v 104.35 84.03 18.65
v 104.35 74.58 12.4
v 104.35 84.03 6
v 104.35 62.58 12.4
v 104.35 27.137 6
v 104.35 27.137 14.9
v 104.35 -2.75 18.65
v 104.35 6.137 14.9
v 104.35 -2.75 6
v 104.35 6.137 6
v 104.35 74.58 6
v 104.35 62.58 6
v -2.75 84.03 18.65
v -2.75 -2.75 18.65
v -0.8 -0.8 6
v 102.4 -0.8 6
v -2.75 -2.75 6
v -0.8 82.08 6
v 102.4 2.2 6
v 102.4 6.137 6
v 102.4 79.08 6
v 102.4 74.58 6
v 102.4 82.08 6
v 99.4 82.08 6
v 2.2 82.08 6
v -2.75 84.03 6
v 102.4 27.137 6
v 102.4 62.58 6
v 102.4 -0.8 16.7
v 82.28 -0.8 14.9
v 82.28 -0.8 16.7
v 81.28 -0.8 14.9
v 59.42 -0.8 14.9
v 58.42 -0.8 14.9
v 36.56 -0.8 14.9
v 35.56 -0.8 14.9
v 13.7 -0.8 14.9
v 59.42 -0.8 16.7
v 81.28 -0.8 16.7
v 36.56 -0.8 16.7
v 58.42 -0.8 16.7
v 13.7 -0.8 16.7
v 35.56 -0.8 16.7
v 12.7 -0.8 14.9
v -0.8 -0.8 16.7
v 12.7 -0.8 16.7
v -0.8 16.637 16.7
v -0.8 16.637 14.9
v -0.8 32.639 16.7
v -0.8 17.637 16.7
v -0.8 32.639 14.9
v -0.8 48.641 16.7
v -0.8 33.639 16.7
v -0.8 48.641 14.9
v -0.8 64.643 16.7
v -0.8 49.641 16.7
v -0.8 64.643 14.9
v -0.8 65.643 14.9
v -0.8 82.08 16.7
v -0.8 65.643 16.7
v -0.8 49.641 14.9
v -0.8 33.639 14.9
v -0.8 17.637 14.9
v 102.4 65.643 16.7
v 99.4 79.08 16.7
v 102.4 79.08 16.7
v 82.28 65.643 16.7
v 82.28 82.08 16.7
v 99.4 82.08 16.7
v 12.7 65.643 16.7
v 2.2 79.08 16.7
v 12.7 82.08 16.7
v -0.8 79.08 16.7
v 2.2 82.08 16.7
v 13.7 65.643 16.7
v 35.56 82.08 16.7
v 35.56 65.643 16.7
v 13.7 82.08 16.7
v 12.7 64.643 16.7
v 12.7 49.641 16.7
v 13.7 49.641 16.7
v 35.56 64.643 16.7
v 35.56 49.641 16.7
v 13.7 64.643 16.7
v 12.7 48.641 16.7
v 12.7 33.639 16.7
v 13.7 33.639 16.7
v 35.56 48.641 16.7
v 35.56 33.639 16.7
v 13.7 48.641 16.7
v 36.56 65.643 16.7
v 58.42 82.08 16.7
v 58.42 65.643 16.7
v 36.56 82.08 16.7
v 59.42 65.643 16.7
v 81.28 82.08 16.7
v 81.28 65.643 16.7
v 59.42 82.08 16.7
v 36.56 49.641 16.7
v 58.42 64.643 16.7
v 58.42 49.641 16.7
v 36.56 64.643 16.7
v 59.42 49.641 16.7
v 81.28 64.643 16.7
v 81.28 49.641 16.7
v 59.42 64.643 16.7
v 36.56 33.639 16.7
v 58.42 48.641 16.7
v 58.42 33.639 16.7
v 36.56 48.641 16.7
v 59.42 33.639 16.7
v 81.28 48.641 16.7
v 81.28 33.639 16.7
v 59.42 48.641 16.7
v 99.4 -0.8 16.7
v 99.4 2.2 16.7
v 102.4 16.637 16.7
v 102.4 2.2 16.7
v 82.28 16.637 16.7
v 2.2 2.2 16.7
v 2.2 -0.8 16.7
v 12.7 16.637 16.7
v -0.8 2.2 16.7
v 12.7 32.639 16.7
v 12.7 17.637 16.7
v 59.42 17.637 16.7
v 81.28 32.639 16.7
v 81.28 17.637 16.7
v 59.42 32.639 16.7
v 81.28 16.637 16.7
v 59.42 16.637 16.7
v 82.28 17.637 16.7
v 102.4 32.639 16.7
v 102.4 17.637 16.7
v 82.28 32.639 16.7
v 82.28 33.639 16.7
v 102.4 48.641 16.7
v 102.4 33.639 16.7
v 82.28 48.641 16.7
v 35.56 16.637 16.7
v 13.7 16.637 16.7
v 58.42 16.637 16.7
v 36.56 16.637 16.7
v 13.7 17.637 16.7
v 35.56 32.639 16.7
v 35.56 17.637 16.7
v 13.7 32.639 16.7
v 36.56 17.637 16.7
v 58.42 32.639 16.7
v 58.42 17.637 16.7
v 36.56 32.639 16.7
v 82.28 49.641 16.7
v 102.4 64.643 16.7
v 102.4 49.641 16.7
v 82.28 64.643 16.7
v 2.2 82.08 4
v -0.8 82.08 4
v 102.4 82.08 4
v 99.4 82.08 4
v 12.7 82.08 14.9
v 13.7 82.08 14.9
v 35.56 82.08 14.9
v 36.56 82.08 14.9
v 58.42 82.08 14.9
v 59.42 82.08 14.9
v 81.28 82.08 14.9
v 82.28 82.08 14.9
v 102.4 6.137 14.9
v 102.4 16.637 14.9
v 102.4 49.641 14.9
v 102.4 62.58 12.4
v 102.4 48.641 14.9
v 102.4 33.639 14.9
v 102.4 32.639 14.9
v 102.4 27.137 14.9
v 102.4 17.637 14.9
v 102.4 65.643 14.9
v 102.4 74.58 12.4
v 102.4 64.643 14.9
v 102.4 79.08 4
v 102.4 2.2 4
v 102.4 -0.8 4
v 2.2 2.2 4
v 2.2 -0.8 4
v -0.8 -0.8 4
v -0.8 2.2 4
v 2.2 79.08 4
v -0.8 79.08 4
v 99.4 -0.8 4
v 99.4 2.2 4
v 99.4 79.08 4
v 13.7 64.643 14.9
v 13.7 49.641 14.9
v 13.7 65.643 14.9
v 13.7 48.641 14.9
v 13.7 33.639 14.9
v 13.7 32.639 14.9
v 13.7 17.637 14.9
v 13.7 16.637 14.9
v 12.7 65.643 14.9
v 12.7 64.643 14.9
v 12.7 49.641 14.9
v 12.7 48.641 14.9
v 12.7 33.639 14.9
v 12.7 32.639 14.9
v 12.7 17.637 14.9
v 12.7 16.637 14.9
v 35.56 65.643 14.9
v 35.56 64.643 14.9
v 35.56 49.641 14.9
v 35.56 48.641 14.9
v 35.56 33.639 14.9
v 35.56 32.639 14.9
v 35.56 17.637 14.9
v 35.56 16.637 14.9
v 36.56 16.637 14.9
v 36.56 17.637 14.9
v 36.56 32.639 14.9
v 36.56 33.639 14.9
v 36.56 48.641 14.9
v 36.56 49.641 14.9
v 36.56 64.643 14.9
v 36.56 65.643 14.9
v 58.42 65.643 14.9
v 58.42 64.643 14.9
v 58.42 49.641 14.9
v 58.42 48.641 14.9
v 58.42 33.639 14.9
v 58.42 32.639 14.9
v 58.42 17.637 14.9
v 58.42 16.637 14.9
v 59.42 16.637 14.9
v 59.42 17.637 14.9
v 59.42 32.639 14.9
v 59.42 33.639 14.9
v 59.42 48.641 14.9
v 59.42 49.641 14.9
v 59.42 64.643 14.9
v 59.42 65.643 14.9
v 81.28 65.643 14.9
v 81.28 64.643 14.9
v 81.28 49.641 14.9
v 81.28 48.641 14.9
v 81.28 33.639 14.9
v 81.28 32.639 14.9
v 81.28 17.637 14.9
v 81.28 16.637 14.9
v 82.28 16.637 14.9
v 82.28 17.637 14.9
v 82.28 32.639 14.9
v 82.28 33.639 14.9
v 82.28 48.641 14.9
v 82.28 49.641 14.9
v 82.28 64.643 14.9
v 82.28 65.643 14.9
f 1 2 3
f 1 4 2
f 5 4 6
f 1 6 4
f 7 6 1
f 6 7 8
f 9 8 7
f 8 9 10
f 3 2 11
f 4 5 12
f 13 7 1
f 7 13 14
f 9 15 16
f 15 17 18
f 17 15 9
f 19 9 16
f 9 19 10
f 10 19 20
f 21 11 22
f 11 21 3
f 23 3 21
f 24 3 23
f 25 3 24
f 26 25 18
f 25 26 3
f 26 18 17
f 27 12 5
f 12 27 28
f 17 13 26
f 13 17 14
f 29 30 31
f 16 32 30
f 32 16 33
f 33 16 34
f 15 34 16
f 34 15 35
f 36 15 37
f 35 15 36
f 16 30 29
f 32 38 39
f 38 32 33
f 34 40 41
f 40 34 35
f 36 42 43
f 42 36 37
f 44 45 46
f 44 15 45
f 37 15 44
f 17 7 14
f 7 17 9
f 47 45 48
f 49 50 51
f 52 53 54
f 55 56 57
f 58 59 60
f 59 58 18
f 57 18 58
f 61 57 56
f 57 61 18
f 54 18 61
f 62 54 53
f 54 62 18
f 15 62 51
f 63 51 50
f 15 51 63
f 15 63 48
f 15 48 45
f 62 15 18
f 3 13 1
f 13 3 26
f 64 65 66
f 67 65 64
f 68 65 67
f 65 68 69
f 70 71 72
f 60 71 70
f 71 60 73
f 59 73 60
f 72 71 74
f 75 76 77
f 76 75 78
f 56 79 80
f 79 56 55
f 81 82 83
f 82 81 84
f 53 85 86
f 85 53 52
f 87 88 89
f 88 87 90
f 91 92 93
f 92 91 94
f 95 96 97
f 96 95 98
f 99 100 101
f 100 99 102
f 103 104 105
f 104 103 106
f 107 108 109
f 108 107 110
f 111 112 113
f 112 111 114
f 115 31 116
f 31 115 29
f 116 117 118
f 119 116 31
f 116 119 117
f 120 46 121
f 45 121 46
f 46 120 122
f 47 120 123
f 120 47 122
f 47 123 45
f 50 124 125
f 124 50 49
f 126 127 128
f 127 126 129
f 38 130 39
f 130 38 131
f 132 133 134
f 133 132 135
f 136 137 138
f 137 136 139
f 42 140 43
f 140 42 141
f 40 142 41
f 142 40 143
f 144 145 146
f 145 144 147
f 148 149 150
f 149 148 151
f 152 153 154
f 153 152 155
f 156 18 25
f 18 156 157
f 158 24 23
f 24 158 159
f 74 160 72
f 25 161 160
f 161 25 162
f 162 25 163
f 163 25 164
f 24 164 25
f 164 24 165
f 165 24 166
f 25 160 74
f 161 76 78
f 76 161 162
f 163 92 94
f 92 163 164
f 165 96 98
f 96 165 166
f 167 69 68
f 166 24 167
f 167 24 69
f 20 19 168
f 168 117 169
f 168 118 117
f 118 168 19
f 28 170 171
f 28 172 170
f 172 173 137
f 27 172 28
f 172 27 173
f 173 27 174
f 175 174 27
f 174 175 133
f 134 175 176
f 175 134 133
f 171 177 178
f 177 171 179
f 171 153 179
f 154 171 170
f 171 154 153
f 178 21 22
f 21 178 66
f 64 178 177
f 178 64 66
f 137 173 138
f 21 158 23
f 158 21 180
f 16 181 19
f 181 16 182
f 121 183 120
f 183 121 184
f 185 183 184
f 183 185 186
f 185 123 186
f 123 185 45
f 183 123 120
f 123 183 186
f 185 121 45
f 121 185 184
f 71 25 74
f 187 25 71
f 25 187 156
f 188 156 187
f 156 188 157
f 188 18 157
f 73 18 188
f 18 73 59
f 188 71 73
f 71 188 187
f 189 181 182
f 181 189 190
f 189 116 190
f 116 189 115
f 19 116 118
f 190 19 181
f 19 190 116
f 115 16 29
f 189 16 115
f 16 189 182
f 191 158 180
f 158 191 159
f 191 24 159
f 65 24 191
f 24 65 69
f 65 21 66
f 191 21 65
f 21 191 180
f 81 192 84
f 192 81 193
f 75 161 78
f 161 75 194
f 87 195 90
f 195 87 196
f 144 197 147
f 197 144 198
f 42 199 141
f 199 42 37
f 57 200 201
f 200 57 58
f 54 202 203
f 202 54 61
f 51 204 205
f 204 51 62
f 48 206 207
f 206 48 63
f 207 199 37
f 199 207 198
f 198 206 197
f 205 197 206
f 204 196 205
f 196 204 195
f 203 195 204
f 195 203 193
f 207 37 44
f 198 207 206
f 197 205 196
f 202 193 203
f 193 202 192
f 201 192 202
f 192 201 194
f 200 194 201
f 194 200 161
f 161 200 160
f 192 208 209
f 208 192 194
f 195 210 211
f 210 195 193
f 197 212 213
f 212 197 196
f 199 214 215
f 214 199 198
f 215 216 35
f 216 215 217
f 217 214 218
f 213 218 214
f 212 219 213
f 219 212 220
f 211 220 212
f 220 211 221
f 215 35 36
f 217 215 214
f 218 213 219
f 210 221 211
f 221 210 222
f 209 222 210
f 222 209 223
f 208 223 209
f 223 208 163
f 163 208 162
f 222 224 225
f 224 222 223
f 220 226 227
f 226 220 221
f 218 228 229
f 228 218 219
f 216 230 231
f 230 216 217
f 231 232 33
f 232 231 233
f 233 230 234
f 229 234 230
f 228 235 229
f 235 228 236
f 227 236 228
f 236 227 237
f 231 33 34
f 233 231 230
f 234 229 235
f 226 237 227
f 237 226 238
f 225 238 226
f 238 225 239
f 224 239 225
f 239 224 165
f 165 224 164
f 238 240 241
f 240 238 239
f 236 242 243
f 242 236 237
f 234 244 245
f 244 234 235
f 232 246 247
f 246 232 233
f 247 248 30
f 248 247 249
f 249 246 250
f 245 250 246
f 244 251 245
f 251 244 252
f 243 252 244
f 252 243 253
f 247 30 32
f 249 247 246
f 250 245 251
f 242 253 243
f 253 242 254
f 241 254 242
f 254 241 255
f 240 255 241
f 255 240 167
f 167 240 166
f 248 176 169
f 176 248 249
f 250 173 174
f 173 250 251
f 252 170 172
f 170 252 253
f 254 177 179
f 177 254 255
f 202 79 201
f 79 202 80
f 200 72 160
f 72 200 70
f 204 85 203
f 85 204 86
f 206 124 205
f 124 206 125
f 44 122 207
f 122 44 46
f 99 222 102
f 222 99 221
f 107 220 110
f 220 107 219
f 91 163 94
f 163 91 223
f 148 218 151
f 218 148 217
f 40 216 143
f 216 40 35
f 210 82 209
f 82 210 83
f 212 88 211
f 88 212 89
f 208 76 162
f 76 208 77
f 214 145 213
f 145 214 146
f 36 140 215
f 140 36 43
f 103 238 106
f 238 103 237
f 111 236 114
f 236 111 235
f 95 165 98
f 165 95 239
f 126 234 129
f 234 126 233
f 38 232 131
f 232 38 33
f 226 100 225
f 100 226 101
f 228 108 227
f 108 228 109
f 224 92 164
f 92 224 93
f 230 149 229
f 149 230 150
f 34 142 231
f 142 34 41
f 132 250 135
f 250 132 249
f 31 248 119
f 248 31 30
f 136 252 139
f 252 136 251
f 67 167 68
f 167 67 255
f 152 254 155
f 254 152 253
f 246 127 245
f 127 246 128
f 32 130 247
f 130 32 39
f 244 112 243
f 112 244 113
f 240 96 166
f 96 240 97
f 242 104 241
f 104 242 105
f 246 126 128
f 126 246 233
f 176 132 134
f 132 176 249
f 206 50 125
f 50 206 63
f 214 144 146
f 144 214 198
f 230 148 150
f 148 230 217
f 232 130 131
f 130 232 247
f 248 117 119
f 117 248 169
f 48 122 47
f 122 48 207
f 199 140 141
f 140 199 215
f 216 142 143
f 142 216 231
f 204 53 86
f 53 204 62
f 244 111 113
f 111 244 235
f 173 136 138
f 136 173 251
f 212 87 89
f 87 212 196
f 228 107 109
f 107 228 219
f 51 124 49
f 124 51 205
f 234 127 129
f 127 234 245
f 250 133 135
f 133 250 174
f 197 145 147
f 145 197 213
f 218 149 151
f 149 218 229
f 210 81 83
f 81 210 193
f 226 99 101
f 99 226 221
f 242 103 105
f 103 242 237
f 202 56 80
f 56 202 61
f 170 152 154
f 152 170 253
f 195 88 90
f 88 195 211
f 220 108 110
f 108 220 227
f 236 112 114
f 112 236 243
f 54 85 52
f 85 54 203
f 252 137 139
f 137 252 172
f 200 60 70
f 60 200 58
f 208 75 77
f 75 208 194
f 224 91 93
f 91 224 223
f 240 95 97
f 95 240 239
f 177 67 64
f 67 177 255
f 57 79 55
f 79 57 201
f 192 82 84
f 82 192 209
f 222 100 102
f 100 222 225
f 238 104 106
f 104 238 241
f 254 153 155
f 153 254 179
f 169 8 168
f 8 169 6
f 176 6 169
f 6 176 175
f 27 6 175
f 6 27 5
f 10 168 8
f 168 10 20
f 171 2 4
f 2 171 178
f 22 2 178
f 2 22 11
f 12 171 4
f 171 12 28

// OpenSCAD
// Enclosure for GNSS Firehose board, top piece
//
// GNSS Firehose
// Copyright (c) 2012 Peter Monta <pmonta@gmail.com>


//
// wall cutouts for connectors
//

module cutout(x,y)
{ translate([0,-y/2,-100]) cube([x,y,100]); }

//
// ribs in y and x directions
// 1.0 mm thick, 1.8 mm high
//

module rib_y(y)
{ translate([0,0,-1.8]) cube([1.0,y,1.95+1.8],center=false); }

module rib_x(x)
{ translate([0,0,-1.8]) cube([x,1.0,1.95+1.8],center=false); }

//
// main
//

module gnss_firehose_top()
{ pcb_x = 4.000*25.4;  // PCB dimensions
  pcb_y = 3.200*25.4;
  eps = 0.8;           // clearance gap between PCB and plastic
  wall = 1.95;         // wall thickness
  base = 1.95;         // base thickness
  h = 6;               // starting height above PCB
  cavity = 10.7;       // additional clearance height
  m = 25.4;            // convert between inch and mm

  _w = wall+eps;             // derived quantities
  _th = h+cavity;

  difference () {
    union () {
      translate([-_w, -_w, _th])                                // base plate
        cube([pcb_x+2*_w, pcb_y+2*_w, base]);
      translate([-_w, -_w, h]) {                                // walls
        cube([pcb_x+2*_w, wall, cavity+base]);
        cube([wall, pcb_y+2*_w, cavity+base]);
      }
      translate([-_w, pcb_y+eps, h])
        cube([pcb_x+2*_w, wall, cavity+base]);
      translate([pcb_x+eps, -_w, h])
        cube([wall, pcb_y+2*_w, cavity+base]);
      translate([-eps, -eps, h-2])               cube([3, 3, 2+cavity+base]);        // retaining pins
      translate([-eps, pcb_y+eps-3, h-2])        cube([3, 3, 2+cavity+base]);
      translate([pcb_x+eps-3, -eps, h-2])        cube([3, 3, 2+cavity+base]);
      translate([pcb_x+eps-3, pcb_y+eps-3, h-2]) cube([3, 3, 2+cavity+base]);
      translate([0.5*m,-_w,_th]) rib_y(pcb_y+2*_w);             // vertical ribs
      translate([1.4*m,-_w,_th]) rib_y(pcb_y+2*_w);
      translate([2.3*m,-_w,_th]) rib_y(pcb_y+2*_w);
      translate([3.2*m,-_w,_th]) rib_y(pcb_y+2*_w);
      translate([-_w,(0.340+0.315)*m,_th]) rib_x(pcb_x+2*_w);   // horizontal ribs
      translate([-_w,(0.970+0.315)*m,_th]) rib_x(pcb_x+2*_w);
      translate([-_w,(1.600+0.315)*m,_th]) rib_x(pcb_x+2*_w);
      translate([-_w,(2.230+0.315)*m,_th]) rib_x(pcb_x+2*_w);
    }
    union () {
      translate([pcb_x+eps,0.655*m,_th-1.8]) cutout(wall,21);        // Ethernet cutout
      translate([pcb_x+eps,2.700*m,_th-1.8-2.5]) cutout(wall,12);    // power-jack cutout
    }
  }
}

$fn=20;
gnss_firehose_top();
